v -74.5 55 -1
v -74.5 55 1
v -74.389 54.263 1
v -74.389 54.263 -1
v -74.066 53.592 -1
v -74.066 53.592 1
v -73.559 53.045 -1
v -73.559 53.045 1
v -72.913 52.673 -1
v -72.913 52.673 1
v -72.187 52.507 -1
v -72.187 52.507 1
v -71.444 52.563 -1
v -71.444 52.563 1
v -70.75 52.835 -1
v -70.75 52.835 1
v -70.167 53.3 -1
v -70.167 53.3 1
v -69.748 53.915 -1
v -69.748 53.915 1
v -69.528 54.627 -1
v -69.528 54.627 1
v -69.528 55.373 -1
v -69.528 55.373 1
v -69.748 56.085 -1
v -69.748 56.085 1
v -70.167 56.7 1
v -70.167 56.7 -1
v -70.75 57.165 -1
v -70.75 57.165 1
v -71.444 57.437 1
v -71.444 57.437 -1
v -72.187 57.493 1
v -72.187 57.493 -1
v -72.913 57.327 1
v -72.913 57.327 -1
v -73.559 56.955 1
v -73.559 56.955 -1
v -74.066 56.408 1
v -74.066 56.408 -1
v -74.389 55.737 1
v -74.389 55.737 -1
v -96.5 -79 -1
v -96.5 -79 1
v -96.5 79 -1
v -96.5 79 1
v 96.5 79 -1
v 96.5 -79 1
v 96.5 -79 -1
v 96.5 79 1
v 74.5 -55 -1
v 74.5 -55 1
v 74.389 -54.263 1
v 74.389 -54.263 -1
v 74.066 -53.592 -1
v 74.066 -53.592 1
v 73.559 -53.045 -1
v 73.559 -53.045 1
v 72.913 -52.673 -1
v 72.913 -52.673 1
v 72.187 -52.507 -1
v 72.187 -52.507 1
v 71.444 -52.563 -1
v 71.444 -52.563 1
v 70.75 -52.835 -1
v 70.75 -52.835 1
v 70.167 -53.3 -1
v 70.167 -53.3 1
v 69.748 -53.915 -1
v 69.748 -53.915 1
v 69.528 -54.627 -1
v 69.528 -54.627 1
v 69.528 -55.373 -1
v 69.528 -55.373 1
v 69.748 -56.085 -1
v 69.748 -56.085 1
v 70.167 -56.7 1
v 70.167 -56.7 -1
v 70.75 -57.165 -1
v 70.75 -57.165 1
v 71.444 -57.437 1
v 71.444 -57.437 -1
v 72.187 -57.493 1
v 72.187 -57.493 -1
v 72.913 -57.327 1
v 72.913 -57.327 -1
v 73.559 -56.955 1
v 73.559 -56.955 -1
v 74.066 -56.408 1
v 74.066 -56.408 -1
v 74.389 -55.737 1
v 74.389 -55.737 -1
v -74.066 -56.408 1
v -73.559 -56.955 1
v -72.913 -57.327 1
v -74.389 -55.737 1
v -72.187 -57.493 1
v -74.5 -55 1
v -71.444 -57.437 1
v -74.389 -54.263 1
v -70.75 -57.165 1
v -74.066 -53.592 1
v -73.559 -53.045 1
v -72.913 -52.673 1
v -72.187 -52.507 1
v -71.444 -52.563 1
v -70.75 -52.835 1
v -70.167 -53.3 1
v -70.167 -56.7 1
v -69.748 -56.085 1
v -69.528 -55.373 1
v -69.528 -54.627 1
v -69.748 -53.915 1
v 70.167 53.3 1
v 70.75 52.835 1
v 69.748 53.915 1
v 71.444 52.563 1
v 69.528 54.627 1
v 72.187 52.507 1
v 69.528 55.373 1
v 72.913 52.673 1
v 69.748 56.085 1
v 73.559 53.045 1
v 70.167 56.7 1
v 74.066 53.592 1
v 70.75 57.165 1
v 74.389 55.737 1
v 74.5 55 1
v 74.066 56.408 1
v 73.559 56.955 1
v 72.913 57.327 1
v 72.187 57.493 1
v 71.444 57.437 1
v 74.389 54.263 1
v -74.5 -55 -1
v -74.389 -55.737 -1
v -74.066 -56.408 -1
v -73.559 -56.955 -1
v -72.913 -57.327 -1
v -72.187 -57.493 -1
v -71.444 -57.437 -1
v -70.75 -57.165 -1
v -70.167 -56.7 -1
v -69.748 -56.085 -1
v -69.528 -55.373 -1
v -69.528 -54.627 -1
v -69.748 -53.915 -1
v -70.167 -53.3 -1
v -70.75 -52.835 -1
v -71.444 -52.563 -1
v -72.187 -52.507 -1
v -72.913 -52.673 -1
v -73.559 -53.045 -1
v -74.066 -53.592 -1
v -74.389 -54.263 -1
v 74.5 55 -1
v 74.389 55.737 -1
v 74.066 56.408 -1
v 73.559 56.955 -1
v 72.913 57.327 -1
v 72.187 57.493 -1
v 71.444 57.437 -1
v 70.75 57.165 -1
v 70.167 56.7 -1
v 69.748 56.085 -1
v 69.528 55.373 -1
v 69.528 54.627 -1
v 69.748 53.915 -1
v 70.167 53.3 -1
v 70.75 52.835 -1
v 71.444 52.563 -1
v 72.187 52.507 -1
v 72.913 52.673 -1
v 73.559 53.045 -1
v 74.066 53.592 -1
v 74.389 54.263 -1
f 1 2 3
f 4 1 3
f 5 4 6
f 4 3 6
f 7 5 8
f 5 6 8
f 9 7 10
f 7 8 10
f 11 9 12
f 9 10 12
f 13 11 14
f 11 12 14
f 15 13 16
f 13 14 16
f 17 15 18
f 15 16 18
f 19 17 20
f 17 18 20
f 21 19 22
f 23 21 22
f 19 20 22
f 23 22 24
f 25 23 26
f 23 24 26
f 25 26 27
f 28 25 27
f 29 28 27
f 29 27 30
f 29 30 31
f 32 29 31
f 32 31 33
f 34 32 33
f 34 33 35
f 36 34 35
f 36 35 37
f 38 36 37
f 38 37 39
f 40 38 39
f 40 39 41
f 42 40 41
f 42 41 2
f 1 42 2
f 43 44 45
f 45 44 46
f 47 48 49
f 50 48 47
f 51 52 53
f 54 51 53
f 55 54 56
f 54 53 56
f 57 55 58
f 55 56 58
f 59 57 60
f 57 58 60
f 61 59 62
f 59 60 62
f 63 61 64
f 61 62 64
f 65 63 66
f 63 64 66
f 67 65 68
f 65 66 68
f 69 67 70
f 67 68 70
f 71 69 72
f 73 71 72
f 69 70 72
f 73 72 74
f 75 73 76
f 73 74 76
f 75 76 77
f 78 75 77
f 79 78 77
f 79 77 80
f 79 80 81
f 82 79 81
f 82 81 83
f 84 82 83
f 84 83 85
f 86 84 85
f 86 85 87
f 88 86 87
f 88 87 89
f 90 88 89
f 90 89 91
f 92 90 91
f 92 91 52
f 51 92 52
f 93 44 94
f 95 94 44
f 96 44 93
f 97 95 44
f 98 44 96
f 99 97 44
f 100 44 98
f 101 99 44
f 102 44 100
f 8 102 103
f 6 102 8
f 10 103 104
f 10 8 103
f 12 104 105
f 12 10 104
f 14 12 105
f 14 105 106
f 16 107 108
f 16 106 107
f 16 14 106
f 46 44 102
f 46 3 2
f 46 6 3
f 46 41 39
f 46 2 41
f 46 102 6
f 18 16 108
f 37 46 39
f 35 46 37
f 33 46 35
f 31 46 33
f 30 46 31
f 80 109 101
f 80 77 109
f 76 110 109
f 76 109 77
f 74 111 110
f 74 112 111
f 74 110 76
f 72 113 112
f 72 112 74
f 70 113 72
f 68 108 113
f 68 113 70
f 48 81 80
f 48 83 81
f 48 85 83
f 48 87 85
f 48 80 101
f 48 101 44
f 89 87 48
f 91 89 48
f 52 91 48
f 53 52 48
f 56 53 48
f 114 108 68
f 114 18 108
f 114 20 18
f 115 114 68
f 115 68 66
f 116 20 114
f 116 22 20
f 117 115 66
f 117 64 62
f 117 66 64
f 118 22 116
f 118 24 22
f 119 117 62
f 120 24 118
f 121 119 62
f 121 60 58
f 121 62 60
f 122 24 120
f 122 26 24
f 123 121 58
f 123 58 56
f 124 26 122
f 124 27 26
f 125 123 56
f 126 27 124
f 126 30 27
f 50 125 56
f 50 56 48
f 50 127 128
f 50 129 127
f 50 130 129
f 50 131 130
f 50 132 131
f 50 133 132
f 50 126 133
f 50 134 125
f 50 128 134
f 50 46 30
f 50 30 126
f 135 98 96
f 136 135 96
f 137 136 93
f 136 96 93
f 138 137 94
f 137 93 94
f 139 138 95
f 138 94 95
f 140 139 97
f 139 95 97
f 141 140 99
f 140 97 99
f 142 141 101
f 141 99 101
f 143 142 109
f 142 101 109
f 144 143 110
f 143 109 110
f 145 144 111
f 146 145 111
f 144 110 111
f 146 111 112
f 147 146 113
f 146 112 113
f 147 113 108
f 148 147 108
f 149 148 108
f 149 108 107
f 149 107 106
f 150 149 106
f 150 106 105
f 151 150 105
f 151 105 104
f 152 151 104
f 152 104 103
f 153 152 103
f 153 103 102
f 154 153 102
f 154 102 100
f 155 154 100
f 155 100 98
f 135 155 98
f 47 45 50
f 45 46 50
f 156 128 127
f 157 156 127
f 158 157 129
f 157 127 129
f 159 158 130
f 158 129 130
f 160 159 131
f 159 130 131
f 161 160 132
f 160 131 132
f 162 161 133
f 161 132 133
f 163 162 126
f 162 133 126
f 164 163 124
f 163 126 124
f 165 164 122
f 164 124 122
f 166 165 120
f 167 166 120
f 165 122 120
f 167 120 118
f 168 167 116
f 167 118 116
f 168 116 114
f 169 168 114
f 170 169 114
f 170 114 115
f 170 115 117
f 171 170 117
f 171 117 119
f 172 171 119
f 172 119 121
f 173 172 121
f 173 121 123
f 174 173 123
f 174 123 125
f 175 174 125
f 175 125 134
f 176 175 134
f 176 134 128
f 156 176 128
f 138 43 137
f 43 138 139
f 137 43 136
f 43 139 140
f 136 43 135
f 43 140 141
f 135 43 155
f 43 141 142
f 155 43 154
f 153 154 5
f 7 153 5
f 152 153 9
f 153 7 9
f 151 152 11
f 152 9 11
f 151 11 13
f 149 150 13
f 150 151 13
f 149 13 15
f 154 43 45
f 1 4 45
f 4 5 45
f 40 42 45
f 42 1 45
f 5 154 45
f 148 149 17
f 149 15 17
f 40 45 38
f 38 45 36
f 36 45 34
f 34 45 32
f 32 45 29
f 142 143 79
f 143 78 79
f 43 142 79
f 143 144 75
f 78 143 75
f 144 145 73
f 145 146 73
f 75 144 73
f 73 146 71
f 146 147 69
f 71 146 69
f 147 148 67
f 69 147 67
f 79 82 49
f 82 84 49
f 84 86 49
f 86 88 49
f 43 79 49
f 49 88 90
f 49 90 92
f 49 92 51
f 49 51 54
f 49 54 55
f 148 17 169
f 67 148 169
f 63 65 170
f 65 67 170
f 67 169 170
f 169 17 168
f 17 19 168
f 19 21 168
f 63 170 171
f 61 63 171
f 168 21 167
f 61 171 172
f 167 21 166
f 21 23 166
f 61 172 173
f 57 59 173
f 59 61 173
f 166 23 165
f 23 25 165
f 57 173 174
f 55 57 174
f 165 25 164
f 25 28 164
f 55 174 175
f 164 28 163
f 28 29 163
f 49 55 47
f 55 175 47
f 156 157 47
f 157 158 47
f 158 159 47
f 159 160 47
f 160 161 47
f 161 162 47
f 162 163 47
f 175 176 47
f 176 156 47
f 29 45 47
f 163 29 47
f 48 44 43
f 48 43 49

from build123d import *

# Parameters (mm, degrees)
SKETCH1_R             = 3
BOSS_EXTRUDE1_DEPTH   = 1
BOSS_EXTRUDE1_2_DEPTH = 1
BOSS_EXTRUDE1_3_DEPTH = 1
BOSS_EXTRUDE1_4_DEPTH = 1
SKETCH1_W             = 193
SKETCH1_H             = 158
BOSS_EXTRUDE1_5_DEPTH = 1
DELETEFACE1_START     = -1
DELETEFACE1_OUTLINE_R = 3
DELETEFACE1_DEPTH     = 2
SKETCH3_R             = 2.5
CUT_EXTRUDE2_DEPTH    = 384.236219583


with BuildPart() as part:
    # Sketch1 → Boss-Extrude1 (new, symmetric)
    with BuildSketch(Plane.XY):
        with Locations((-372, 55)):
            Circle(SKETCH1_R)
    extrude(amount=BOSS_EXTRUDE1_DEPTH, both=True)


with BuildPart() as body_2:
    # Sketch1 → Boss-Extrude1 2 (new, symmetric)
    with BuildSketch(Plane.XY):
        with Locations(Location((-372, -55, 0), (0, 0, 180))):
            Circle(SKETCH1_R)
    extrude(amount=BOSS_EXTRUDE1_2_DEPTH, both=True)


with BuildPart() as body_3:
    # Sketch1 → Boss-Extrude1 3 (new, symmetric)
    with BuildSketch(Plane.XY):
        with Locations((372, -55)):
            Circle(SKETCH1_R)
    extrude(amount=BOSS_EXTRUDE1_3_DEPTH, both=True)


with BuildPart() as body_4:
    # Sketch1 → Boss-Extrude1 4 (new, symmetric)
    with BuildSketch(Plane.XY):
        with Locations(Location((372, 55, 0), (0, 0, 180))):
            Circle(SKETCH1_R)
    extrude(amount=BOSS_EXTRUDE1_4_DEPTH, both=True)


with BuildPart() as body_5:
    # Sketch1 → Boss-Extrude1 5 (new, symmetric)
    with BuildSketch(Plane.XY):
        Rectangle(SKETCH1_W, SKETCH1_H)
        with Locations((0, 55)):
            Circle(SKETCH1_R, mode=Mode.SUBTRACT)
        with Locations(Location((0, -55, 0), (0, 0, 180))):
            Circle(SKETCH1_R, mode=Mode.SUBTRACT)
    extrude(amount=BOSS_EXTRUDE1_5_DEPTH, both=True)

    # DeleteFace1: read off the stored shape, not the designer's step
    # DeleteFace1 outline → DeleteFace1 (add)
    with BuildSketch(Plane.XY.offset(DELETEFACE1_START)):
        with Locations((0, 55)):
            Circle(DELETEFACE1_OUTLINE_R)
        with Locations((0, -55)):
            Circle(DELETEFACE1_OUTLINE_R)
    extrude(amount=DELETEFACE1_DEPTH)

    # Sketch3 → Cut-Extrude2 (cut, through all)
    with BuildSketch(Plane.XY.offset(1)):
        with Locations(Location((-72, 55, 0), (0, 0, 180))):
            Circle(SKETCH3_R)
        with Locations((72, -55)):
            Circle(SKETCH3_R)
        with Locations((72, 55)):
            Circle(SKETCH3_R)
        with Locations(Location((-72, -55, 0), (0, 0, 180))):
            Circle(SKETCH3_R)
    extrude(amount=-CUT_EXTRUDE2_DEPTH, mode=Mode.SUBTRACT)


solid = body_5.part
